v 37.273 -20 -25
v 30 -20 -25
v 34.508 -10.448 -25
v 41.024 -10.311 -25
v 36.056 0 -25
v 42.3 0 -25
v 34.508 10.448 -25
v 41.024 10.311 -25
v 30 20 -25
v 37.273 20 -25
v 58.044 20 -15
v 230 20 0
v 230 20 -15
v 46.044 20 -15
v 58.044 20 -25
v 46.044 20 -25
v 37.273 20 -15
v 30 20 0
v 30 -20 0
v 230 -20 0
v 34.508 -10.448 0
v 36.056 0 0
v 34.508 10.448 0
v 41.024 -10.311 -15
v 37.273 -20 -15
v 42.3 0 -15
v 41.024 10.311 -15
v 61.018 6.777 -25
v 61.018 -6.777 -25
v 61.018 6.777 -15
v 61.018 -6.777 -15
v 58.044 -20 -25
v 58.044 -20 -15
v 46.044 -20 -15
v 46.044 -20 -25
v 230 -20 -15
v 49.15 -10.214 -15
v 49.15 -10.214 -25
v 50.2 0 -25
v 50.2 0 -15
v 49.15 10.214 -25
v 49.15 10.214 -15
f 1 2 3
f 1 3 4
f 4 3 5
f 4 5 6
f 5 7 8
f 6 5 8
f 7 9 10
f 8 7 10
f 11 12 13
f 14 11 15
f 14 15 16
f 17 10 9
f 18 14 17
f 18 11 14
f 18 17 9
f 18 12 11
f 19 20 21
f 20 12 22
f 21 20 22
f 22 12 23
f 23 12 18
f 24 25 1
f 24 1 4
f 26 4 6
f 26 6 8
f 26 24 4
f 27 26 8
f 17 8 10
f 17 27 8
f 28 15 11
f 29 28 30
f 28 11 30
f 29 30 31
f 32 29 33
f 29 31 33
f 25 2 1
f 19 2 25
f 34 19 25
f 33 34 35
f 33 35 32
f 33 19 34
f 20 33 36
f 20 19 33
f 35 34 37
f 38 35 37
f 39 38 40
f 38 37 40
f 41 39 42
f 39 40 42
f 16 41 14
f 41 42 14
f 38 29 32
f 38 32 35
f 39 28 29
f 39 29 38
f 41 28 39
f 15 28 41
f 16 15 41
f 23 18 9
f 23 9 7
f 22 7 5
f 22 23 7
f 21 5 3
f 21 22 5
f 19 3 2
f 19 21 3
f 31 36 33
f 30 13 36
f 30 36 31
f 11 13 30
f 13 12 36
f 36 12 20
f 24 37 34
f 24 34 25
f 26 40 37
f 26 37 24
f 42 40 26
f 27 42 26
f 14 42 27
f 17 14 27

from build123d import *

# Parameters (mm, degrees)
BOSS_EXTRUDE1_DEPTH = 15
BOSS_EXTRUDE2_DEPTH = 10


with BuildPart() as part:
    # Sketch3 → Boss-Extrude1 (new body)
    with BuildSketch(Plane.XY):
        with BuildLine():
            Line((230, 20), (230, -20))
            Line((230, -20), (30, -20))
            ThreePointArc((30, -20), (36.055512755, 0), (30, 20))
            Line((30, 20), (230, 20))
        make_face()
    extrude(amount=-BOSS_EXTRUDE1_DEPTH)

    # Sketch6 → Boss-Extrude2 (add)
    with BuildSketch(Plane(origin=(0, 0, -15), x_dir=(-1, 0, 0), z_dir=(0, 0, -1))):
        with BuildLine():
            Line((-37.273180707, 20), (-30, 20))
            ThreePointArc((-30, 20), (-36.055512755, 0), (-30, -20))
            Line((-30, -20), (-37.273180707, -20))
            ThreePointArc((-37.273180707, -20), (-42.3, 0), (-37.273180707, 20))
        make_face()
        with BuildLine():
            Line((-46.043892103, 20), (-58.043892103, 20))
            ThreePointArc((-58.043892103, 20), (-61.392942676, 0), (-58.043892103, -20))
            Line((-58.043892103, -20), (-46.043892103, -20))
            ThreePointArc((-46.043892103, -20), (-50.2, 0), (-46.043892103, 20))
        make_face()
    extrude(amount=BOSS_EXTRUDE2_DEPTH)


solid = part.part
